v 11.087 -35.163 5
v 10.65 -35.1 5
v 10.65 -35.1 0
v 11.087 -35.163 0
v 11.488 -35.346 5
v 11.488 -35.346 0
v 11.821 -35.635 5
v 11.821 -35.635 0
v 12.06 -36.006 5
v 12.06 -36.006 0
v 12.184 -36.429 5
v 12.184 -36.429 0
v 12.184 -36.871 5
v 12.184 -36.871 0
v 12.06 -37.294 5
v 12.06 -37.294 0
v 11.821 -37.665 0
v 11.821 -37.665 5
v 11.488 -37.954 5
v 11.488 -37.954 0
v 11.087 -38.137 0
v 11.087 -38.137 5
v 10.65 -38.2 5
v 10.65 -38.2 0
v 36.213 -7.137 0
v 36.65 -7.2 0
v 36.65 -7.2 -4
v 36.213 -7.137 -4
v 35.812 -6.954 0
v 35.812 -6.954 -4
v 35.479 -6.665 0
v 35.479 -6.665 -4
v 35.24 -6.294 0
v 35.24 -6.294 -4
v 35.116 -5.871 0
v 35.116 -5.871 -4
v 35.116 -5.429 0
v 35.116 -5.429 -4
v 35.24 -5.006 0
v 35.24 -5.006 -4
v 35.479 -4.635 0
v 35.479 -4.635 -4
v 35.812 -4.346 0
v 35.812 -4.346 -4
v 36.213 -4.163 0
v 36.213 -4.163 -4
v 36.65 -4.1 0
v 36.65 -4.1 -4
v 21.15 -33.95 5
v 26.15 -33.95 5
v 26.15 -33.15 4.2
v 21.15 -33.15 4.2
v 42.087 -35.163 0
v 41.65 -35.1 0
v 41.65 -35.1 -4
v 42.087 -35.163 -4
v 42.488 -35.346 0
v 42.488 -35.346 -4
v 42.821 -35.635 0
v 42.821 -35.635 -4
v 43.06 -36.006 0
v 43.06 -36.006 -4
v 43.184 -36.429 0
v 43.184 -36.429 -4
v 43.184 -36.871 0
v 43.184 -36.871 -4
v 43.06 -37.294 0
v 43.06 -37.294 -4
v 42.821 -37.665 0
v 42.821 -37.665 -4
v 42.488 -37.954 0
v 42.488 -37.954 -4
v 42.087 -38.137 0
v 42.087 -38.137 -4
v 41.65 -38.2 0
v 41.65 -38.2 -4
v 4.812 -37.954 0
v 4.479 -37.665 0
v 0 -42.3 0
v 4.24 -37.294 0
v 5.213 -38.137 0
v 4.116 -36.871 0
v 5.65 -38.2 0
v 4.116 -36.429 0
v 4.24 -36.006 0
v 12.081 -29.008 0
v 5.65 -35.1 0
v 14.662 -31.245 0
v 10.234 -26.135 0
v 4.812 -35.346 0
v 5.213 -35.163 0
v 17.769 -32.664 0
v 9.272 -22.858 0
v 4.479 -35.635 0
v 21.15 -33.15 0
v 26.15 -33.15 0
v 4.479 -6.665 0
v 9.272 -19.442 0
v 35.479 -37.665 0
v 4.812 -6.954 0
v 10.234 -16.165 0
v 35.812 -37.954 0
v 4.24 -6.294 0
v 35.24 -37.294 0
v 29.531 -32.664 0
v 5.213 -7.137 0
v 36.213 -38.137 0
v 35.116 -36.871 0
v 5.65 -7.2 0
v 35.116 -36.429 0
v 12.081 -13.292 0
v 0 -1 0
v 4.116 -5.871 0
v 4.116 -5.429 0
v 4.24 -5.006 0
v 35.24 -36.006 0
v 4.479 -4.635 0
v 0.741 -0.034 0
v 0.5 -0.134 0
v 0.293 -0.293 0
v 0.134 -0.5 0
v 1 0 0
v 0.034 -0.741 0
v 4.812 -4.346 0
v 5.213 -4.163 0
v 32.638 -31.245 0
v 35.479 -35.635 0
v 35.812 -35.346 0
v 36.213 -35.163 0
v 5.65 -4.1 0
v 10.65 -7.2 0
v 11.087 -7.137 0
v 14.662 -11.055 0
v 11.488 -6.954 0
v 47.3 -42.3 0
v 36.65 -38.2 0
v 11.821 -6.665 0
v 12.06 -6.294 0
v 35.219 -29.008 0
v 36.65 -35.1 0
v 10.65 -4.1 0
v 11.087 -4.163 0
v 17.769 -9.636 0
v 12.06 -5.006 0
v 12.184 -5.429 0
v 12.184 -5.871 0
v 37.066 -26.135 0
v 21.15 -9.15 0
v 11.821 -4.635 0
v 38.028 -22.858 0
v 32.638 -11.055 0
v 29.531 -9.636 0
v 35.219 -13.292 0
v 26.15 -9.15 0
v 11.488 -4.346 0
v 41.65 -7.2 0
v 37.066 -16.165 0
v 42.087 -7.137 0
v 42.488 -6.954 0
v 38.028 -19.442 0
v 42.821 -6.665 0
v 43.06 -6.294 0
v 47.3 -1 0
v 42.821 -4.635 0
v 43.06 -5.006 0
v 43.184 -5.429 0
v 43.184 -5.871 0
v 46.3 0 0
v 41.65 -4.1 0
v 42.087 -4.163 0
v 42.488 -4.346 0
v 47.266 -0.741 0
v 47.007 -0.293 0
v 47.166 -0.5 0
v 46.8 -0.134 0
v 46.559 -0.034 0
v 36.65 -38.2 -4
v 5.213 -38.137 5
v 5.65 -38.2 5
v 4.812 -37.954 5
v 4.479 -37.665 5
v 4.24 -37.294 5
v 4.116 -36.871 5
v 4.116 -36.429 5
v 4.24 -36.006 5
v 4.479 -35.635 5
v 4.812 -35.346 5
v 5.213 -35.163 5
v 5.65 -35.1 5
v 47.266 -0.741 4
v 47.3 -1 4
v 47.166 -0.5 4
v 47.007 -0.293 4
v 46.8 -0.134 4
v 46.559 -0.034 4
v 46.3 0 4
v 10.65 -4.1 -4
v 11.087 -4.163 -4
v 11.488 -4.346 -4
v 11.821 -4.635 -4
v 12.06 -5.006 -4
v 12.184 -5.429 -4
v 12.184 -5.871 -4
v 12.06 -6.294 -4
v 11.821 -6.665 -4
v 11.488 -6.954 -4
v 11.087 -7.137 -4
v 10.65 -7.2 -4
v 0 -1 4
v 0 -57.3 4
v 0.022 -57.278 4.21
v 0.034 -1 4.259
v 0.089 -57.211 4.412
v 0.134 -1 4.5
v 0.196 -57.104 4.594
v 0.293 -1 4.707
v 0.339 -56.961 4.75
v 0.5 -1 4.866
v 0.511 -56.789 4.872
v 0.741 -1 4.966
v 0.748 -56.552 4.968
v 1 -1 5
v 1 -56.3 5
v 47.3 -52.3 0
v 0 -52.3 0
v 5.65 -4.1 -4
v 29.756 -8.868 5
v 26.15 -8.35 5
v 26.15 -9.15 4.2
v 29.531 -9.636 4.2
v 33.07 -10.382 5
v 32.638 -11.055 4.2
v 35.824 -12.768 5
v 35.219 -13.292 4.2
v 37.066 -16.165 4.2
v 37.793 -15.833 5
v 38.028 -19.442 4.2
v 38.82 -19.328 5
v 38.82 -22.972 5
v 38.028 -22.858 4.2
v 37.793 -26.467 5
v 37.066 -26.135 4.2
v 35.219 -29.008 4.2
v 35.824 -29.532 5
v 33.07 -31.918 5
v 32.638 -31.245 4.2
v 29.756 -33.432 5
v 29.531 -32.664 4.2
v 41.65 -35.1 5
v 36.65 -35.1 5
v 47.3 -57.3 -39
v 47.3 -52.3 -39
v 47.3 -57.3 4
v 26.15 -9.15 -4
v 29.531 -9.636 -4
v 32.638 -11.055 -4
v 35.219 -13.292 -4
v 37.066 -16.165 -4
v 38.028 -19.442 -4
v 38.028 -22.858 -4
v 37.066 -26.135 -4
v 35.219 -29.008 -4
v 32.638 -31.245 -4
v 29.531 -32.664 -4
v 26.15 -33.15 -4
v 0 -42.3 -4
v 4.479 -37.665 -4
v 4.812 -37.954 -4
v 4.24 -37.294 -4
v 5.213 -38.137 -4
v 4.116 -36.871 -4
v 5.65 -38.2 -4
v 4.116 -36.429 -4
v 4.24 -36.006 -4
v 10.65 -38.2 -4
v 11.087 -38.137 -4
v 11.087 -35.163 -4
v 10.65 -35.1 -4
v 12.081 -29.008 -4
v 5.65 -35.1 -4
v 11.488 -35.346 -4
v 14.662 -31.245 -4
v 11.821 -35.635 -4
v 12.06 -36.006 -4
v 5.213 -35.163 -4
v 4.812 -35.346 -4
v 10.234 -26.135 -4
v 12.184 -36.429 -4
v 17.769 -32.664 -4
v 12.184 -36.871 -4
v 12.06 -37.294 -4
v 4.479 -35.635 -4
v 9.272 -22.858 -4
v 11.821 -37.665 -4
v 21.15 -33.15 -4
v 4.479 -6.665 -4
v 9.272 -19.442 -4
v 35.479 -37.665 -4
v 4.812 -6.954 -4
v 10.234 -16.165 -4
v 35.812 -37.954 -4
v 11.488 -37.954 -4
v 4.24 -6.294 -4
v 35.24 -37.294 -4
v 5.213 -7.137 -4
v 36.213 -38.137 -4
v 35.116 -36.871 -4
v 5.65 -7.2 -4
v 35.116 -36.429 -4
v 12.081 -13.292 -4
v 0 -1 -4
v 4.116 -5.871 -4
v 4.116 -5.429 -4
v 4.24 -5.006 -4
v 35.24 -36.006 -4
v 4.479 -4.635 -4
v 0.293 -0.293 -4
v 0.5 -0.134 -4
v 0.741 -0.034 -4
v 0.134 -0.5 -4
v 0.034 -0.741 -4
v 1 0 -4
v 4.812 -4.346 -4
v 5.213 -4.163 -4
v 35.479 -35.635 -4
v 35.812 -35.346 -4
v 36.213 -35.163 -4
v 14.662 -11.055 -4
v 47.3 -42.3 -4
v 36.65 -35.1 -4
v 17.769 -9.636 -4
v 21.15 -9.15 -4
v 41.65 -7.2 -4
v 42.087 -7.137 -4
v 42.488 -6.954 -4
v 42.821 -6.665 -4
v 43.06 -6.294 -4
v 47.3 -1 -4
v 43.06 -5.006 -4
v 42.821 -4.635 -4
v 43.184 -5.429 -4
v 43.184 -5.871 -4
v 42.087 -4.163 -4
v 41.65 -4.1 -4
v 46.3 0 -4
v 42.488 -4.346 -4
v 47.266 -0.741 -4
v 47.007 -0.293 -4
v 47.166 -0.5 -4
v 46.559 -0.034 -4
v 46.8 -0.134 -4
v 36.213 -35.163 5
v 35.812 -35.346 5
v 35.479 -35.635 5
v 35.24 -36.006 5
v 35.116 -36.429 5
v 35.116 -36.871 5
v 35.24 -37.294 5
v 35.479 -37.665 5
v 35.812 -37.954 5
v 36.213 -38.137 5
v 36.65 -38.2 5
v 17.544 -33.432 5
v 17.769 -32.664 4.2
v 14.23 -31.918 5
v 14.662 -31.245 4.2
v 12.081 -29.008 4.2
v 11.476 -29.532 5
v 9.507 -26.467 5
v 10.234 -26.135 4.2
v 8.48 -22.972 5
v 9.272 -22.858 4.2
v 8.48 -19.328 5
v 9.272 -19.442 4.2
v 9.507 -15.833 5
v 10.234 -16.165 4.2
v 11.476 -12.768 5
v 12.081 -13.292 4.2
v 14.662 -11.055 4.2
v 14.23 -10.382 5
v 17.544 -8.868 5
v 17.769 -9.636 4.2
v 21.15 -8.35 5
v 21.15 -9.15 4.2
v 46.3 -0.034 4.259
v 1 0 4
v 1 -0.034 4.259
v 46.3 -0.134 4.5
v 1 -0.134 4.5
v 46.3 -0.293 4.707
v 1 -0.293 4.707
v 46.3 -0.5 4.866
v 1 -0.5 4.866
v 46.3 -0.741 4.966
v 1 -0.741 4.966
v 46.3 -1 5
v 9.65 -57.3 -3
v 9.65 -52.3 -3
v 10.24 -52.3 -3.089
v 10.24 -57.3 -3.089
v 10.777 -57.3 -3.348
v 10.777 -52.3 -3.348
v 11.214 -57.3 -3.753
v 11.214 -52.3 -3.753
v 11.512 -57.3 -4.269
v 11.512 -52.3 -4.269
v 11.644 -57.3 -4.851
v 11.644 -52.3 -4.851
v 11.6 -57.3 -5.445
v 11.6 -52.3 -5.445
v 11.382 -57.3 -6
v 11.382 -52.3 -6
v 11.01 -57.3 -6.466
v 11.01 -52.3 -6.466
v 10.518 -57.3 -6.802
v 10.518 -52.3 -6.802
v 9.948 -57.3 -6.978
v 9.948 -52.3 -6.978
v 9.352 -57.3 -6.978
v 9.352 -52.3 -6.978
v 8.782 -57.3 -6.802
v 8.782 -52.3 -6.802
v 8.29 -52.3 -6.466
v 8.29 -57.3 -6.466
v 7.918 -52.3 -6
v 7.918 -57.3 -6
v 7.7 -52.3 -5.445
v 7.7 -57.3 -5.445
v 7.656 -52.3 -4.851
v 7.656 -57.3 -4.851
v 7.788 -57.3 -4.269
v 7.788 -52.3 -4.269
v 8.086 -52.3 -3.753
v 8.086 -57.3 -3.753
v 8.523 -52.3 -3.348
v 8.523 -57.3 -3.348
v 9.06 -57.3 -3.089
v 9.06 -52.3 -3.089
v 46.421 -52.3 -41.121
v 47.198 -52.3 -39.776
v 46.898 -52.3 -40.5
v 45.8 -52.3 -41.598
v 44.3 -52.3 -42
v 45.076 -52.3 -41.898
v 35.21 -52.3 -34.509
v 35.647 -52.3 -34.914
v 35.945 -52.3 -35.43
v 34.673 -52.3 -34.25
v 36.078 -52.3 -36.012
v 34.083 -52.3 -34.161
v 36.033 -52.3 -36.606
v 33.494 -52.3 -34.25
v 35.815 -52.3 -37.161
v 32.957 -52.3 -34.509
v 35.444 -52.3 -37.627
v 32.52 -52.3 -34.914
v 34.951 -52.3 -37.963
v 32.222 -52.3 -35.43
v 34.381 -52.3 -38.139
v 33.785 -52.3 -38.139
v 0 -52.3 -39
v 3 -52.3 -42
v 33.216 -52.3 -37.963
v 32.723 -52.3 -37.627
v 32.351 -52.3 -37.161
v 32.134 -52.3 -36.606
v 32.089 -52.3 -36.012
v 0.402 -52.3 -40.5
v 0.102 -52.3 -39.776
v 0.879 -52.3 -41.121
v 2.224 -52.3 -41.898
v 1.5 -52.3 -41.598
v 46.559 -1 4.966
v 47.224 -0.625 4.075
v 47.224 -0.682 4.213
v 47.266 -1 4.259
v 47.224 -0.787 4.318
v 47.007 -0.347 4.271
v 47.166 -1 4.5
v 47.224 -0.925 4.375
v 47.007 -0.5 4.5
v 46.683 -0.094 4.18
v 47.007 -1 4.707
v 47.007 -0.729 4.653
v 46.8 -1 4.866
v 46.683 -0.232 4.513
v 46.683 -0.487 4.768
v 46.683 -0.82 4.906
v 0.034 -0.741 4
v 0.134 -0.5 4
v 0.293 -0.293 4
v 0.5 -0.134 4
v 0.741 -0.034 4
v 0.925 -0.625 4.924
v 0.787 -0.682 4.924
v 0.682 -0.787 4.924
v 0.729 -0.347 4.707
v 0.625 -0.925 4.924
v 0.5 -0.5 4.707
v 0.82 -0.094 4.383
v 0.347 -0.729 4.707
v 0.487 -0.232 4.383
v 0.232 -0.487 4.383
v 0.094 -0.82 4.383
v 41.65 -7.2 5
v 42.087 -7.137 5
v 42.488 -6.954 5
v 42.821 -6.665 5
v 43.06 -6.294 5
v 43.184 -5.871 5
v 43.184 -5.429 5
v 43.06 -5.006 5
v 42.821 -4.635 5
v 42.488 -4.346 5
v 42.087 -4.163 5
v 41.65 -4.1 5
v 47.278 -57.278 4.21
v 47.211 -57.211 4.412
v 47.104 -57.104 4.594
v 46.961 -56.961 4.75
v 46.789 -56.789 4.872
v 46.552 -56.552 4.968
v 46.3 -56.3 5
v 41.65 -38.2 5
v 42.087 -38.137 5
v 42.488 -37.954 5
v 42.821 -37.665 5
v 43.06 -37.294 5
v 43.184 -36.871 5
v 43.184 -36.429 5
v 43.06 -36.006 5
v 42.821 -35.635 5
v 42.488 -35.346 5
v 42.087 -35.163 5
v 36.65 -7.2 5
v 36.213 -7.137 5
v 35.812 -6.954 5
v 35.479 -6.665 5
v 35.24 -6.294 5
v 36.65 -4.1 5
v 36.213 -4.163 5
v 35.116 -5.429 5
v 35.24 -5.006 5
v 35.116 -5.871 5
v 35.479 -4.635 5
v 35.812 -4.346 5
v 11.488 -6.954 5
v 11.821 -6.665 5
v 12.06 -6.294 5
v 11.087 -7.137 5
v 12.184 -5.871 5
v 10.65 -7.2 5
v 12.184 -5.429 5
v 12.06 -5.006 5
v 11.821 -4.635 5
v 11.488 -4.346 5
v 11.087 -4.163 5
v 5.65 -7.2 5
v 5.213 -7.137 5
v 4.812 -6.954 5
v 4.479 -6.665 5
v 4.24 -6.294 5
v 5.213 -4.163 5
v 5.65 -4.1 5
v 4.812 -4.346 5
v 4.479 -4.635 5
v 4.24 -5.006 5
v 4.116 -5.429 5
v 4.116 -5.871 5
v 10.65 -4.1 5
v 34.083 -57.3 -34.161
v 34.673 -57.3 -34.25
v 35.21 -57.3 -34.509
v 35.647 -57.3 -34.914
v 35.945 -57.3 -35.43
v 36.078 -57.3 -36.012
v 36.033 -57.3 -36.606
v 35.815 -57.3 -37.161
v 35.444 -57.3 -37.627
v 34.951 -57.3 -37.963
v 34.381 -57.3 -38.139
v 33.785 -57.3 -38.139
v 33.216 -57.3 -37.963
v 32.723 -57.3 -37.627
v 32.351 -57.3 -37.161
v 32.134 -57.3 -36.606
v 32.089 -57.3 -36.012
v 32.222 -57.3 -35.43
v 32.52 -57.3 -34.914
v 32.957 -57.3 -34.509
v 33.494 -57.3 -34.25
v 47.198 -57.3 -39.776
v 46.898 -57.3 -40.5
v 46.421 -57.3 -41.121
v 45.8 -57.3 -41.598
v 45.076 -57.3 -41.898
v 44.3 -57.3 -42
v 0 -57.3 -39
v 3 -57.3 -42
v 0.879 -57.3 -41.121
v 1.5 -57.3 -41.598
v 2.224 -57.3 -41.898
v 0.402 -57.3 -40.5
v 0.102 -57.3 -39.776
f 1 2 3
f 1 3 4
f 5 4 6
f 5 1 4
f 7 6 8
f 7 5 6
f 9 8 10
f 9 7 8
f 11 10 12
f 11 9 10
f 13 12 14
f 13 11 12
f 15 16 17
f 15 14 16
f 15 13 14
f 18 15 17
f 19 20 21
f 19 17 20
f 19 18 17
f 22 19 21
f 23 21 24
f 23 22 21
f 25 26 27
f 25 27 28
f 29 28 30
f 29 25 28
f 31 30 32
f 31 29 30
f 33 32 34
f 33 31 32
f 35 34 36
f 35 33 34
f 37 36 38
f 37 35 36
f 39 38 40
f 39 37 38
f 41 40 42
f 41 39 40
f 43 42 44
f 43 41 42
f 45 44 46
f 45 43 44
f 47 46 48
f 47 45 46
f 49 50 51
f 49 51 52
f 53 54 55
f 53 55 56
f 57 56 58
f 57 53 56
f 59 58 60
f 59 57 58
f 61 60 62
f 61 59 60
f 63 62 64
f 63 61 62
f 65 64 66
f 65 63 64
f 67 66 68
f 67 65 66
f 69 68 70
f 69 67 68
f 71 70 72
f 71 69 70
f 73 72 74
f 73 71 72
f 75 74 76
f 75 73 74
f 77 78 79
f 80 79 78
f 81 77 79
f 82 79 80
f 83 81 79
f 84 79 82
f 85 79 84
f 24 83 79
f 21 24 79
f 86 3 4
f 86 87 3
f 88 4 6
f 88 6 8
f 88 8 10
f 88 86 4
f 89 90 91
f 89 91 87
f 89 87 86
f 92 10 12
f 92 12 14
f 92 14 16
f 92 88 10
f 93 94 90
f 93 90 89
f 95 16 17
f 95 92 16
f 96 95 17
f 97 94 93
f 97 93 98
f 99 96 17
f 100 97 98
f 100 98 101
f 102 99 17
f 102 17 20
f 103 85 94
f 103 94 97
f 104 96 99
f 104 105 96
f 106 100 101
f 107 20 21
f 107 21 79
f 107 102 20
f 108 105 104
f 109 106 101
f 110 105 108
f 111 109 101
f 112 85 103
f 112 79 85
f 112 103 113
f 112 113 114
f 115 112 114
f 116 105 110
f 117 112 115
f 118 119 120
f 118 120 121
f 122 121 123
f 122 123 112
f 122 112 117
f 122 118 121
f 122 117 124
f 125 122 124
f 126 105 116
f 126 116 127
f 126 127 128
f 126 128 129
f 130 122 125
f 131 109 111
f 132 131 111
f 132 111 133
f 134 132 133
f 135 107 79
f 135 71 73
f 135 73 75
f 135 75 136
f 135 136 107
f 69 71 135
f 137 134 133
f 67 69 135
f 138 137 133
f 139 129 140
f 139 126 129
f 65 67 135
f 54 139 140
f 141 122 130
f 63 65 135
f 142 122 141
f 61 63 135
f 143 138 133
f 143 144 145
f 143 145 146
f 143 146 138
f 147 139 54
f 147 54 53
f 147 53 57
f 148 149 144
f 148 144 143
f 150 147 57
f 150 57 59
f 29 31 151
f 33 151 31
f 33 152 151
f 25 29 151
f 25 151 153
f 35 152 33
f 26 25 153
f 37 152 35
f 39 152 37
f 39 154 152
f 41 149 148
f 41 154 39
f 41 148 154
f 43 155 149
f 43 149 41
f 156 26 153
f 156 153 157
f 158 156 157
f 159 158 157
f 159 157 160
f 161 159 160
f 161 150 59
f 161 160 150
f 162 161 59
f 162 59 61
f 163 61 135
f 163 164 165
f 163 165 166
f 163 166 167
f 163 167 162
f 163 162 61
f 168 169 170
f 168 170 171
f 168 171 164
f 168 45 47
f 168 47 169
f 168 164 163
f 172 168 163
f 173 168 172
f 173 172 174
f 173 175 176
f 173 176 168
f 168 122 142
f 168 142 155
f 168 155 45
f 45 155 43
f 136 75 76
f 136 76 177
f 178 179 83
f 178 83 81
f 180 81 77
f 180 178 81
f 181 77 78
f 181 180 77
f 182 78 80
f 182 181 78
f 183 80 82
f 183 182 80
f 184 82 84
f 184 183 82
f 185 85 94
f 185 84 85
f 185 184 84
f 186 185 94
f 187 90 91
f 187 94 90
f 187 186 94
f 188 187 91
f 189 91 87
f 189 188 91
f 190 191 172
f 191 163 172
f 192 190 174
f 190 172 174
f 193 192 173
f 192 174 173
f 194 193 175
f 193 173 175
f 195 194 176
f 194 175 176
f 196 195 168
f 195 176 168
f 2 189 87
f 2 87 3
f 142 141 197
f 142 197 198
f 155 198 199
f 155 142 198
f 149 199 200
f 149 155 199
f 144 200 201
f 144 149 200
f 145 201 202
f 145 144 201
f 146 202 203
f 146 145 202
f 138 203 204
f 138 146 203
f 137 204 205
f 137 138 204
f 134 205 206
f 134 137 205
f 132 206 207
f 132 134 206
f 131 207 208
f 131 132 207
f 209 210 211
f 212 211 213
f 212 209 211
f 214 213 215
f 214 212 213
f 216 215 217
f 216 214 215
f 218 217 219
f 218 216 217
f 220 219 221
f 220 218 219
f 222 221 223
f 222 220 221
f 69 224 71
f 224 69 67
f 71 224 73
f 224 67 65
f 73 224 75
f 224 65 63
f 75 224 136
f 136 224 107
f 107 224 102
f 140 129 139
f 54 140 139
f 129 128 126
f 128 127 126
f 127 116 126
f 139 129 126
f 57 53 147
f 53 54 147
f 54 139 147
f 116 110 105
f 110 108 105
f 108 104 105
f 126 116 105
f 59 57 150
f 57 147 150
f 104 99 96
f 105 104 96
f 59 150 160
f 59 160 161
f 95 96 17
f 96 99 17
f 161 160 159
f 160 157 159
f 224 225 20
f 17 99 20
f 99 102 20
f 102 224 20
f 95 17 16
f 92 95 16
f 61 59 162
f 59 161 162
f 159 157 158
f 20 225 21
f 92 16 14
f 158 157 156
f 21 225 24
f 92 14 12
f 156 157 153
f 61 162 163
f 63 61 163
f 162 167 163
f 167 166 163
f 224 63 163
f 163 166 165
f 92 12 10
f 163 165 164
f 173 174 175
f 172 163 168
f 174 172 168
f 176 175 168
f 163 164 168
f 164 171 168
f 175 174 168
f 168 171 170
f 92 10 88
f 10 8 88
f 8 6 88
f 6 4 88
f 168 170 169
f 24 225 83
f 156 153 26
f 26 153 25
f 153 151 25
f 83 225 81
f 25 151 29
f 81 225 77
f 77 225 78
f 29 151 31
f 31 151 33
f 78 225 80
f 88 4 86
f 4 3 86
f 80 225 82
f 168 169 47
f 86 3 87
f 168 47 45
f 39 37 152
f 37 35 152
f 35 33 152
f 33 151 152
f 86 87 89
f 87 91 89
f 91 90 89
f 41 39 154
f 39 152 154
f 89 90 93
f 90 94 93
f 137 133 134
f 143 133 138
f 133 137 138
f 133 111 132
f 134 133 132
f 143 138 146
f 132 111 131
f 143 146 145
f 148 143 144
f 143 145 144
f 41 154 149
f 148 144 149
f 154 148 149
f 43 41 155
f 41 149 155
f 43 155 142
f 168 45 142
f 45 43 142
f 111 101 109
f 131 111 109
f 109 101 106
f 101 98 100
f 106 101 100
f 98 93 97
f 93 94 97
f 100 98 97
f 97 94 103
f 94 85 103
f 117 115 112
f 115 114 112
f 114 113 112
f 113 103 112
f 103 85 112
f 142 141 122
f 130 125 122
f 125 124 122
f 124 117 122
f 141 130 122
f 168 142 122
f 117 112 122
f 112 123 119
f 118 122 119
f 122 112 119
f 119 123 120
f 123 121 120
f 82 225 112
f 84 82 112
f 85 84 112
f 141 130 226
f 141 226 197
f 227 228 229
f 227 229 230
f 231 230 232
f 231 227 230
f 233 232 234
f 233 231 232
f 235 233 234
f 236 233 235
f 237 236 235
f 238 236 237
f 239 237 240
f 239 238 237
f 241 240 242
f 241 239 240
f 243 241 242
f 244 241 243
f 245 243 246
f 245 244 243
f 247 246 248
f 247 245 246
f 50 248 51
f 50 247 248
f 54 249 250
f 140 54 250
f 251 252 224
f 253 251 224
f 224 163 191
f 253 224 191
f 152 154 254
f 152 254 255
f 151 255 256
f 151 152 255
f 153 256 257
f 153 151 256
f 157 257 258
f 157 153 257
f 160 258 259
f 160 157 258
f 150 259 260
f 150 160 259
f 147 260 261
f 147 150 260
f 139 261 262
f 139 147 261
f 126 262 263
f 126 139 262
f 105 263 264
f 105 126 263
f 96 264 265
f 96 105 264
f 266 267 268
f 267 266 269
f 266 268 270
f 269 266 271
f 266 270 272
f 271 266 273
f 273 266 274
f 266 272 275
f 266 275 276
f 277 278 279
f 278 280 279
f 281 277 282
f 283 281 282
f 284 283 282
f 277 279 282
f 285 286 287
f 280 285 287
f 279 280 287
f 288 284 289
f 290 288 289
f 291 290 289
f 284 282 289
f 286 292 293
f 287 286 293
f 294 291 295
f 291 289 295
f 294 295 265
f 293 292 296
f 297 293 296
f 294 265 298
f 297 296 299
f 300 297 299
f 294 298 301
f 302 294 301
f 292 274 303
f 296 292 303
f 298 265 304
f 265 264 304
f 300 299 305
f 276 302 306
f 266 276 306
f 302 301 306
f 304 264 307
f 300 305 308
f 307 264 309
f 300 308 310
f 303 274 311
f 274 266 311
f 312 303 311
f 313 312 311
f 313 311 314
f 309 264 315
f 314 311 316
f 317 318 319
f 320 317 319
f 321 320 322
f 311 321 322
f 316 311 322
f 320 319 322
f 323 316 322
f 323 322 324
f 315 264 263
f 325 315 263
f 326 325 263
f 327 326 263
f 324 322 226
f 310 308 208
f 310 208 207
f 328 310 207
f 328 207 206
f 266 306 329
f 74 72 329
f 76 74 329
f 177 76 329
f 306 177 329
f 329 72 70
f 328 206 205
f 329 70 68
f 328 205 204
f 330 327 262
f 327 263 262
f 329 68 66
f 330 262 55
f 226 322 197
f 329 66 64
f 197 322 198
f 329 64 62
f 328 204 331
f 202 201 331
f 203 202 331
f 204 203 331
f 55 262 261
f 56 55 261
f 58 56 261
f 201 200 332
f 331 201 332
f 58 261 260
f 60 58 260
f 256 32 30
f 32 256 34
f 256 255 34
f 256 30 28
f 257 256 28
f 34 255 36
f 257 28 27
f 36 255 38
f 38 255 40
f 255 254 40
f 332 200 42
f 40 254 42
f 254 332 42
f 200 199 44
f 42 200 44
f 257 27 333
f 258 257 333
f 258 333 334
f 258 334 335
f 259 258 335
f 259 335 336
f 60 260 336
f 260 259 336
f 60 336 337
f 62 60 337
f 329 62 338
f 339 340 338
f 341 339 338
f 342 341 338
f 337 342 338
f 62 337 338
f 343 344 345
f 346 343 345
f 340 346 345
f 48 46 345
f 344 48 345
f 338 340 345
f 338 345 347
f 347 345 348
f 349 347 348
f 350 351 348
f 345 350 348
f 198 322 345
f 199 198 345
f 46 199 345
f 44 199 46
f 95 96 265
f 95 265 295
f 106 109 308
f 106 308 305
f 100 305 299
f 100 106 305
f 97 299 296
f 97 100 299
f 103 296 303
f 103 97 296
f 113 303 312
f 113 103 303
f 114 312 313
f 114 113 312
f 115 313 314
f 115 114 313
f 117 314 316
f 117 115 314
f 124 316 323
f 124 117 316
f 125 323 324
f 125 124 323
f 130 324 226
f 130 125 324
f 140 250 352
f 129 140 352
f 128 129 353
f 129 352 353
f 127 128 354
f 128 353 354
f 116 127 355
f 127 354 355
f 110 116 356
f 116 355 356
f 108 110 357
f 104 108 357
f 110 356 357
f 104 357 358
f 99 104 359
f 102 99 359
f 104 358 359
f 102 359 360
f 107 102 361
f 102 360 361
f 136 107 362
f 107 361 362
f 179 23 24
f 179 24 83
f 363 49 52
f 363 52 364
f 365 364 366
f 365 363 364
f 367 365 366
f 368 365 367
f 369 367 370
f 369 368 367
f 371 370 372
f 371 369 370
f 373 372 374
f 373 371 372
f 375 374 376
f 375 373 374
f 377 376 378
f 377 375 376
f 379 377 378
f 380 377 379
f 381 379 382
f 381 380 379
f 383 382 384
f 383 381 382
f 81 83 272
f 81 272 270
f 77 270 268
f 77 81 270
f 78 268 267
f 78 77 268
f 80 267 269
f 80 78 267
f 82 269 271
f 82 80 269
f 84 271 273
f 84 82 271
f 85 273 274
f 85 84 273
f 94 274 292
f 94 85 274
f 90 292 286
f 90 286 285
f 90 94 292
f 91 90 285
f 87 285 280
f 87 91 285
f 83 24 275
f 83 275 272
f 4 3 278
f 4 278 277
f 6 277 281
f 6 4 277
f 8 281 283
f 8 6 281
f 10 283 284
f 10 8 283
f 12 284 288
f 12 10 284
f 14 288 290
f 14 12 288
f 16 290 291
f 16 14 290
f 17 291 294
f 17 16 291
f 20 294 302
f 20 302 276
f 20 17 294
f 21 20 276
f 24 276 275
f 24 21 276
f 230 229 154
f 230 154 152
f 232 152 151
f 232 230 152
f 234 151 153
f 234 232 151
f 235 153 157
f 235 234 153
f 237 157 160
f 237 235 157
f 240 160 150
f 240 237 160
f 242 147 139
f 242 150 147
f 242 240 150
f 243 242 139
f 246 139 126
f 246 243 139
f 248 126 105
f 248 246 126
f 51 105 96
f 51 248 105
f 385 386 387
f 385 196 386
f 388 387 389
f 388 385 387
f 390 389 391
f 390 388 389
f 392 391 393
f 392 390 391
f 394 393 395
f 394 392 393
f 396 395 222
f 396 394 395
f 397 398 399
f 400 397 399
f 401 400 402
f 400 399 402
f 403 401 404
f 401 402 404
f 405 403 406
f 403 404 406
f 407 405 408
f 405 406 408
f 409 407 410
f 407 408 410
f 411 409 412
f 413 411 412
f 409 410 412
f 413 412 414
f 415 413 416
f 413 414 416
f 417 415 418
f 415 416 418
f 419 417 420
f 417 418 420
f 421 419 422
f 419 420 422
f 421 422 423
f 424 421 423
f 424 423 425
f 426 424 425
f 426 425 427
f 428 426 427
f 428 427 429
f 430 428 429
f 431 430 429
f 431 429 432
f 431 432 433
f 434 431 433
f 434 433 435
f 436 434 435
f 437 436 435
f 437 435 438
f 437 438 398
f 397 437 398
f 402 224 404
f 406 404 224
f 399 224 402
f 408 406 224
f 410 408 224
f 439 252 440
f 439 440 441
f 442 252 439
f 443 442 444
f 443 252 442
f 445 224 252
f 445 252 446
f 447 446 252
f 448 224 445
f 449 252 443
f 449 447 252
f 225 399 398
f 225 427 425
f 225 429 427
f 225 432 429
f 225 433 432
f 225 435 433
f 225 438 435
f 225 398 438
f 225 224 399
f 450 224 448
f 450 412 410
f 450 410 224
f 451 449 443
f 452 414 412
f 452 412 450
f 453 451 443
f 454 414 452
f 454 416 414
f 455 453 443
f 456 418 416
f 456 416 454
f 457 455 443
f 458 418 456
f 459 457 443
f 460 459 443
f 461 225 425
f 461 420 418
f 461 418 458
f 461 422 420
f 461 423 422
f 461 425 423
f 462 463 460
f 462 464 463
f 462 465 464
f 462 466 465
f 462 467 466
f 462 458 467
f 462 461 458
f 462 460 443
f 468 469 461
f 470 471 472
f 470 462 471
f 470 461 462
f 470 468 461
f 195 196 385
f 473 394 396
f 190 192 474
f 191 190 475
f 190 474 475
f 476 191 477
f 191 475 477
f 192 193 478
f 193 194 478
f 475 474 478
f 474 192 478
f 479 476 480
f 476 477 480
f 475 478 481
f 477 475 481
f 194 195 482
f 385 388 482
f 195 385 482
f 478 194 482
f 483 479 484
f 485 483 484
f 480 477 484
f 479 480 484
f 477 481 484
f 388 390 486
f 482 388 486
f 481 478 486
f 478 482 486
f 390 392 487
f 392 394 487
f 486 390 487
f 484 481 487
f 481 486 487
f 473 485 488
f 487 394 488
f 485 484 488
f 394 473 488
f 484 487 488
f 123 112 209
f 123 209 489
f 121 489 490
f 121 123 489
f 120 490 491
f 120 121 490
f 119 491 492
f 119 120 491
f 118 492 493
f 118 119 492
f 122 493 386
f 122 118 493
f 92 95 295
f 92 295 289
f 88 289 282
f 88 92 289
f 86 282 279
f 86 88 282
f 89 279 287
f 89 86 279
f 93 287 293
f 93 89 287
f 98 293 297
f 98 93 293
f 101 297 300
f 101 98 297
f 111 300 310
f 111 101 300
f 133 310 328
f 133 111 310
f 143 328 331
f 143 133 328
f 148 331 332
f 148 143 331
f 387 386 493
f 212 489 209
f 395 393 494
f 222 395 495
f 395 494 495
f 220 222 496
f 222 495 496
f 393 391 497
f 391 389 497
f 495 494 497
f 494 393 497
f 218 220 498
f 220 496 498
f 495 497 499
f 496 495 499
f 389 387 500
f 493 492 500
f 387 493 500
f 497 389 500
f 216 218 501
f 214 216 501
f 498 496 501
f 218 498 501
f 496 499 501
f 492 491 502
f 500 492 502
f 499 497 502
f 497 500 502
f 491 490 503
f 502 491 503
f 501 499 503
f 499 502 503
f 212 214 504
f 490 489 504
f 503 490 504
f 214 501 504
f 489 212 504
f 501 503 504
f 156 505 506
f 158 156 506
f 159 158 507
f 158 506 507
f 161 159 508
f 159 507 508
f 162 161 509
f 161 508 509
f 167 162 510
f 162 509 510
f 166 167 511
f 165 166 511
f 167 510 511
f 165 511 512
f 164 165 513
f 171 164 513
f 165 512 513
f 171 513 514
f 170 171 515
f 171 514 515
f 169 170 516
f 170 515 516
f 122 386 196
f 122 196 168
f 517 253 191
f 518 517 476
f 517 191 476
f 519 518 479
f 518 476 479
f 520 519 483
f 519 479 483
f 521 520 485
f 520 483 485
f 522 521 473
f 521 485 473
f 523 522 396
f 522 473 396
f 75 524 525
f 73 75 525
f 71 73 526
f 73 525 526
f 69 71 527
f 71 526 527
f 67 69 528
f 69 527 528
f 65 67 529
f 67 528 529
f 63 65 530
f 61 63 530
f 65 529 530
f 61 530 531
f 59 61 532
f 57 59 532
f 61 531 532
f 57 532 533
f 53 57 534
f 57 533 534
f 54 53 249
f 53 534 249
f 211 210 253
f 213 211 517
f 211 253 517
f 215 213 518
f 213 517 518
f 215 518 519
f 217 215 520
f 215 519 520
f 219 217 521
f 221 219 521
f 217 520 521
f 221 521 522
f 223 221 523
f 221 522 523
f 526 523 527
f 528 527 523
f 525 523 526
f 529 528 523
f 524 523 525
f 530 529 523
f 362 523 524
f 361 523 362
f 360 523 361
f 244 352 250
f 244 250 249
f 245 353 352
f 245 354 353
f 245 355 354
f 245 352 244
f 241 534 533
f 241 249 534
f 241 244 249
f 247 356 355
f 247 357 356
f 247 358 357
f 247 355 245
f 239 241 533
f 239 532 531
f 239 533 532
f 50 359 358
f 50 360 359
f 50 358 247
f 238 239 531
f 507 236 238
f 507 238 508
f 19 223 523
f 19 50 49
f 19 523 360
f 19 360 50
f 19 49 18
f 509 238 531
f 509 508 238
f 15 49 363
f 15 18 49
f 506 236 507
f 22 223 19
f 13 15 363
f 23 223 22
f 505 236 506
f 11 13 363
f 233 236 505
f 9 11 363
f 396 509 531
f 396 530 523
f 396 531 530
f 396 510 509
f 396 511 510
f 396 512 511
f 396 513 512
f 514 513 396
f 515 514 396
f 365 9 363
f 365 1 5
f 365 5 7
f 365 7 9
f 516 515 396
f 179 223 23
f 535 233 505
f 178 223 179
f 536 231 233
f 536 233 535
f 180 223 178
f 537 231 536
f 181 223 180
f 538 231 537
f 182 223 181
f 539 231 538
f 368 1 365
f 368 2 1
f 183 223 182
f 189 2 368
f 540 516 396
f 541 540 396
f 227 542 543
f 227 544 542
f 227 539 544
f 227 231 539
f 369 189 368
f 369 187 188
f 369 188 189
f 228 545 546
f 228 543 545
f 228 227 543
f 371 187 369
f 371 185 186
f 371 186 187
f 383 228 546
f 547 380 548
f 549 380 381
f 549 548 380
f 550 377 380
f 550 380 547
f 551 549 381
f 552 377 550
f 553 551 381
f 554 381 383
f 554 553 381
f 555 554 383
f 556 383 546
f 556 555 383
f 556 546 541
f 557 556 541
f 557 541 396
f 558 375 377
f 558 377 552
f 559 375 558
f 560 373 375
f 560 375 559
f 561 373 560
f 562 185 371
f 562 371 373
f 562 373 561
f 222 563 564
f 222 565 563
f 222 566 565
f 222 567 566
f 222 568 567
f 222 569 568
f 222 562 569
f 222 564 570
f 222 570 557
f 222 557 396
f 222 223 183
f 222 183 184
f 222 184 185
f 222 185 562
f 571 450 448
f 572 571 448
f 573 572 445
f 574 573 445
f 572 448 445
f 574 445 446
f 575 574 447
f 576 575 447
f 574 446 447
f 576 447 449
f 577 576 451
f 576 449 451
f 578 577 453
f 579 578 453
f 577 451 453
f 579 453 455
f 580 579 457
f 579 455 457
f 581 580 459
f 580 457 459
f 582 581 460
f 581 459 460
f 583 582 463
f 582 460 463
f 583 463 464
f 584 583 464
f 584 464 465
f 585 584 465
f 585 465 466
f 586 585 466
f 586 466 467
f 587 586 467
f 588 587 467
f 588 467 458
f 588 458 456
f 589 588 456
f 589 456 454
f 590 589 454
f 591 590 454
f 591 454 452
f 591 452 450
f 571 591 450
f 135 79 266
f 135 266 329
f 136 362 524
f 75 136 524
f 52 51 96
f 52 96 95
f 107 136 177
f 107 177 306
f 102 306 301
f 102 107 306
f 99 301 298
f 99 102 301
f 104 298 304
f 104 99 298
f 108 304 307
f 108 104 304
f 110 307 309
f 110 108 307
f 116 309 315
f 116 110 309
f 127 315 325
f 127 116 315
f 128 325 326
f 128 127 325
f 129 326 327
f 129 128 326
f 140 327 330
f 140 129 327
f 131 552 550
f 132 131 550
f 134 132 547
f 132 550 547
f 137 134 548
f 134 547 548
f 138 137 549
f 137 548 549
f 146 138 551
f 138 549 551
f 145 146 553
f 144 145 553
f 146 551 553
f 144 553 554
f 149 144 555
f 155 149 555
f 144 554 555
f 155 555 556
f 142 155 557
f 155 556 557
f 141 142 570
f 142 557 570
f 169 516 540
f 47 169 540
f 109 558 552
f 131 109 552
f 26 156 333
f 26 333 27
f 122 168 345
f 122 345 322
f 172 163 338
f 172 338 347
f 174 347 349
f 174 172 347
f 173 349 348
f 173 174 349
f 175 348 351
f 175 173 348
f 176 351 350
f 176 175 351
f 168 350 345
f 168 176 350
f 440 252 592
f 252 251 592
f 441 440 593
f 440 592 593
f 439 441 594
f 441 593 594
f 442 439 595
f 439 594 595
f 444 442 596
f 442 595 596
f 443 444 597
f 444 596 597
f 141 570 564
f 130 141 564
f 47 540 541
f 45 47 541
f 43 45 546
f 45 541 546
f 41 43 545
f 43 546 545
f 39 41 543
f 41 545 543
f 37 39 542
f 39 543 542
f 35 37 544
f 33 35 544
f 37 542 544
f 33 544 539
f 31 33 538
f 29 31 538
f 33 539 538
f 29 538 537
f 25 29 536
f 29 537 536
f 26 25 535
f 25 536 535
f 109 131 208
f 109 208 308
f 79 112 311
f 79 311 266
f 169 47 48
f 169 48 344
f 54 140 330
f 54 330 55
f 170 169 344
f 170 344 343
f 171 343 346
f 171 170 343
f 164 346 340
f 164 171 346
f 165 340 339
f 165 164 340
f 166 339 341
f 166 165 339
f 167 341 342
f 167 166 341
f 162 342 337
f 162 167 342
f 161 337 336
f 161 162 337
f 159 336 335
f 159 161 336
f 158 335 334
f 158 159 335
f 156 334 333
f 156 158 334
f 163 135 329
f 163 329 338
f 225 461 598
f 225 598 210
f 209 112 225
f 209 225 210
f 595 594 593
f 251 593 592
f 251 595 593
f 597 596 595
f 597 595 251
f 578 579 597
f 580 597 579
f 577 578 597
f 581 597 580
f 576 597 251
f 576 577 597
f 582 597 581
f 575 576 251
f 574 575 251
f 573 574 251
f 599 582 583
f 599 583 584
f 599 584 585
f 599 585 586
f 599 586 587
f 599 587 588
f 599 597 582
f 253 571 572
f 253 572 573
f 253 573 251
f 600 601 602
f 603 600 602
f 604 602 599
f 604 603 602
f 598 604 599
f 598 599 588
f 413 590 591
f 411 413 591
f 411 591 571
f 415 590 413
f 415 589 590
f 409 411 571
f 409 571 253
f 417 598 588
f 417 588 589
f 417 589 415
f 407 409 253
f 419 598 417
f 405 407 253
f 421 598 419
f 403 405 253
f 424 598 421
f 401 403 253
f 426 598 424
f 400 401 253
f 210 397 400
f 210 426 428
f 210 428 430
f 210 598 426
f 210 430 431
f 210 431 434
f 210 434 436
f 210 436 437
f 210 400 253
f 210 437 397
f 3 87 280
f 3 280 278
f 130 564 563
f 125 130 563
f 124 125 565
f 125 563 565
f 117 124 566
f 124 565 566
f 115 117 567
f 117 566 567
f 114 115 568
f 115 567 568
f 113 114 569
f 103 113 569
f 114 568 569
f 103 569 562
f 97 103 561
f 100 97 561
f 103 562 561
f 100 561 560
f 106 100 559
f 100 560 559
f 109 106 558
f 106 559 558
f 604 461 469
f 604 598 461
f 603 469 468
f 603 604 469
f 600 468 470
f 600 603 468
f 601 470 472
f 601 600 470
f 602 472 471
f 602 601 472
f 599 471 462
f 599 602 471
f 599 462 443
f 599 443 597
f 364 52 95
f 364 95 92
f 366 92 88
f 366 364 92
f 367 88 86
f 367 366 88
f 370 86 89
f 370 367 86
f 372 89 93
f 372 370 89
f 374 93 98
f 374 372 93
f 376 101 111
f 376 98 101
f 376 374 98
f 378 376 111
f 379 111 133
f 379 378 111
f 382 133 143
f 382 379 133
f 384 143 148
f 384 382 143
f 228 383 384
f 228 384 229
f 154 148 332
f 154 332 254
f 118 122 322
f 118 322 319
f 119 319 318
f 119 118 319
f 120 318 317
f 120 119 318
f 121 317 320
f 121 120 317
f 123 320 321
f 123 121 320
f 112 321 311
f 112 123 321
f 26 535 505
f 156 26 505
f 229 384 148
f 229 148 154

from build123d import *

# Parameters (mm, degrees)
BOSS_EXTRUDE2_DEPTH = 47.3
CUT_EXTRUDE1_REACH  = 89.918
FILLET1_R           = 1
CHAMFER1_SIZE       = 0.8
FILLET2_R           = 3
CUT_EXTRUDE2_REACH  = 84.077
SKETCH4_R           = 2
BOSS_EXTRUDE3_DEPTH = 4


with BuildPart() as part:
    # Sketch2 → Boss-Extrude2 (new body)
    with BuildSketch(Plane(origin=(0, 0, 0), x_dir=(0, 0, -1), z_dir=(1, 0, 0))):
        Polygon((0, 0), (0, -47.3), (0, -52.3), (42, -52.3), (42, -57.3), (-5, -57.3), (-5, 0), align=None)
    extrude(amount=BOSS_EXTRUDE2_DEPTH)

    # Sketch3 → Cut-Extrude1 (cut, up to next)
    with BuildSketch(Plane.XY.offset(5), mode=Mode.PRIVATE) as cut_extrude1_sk1:
        with BuildLine():
            Line((21.15, -9.15), (26.15, -9.15))
            ThreePointArc((26.15, -9.15), (38.15, -21.15), (26.15, -33.15))
            Line((26.15, -33.15), (21.15, -33.15))
            ThreePointArc((21.15, -33.15), (9.15, -21.15), (21.15, -9.15))
        make_face()
    cut_extrude1_tool1 = extrude(cut_extrude1_sk1.sketch, amount=-CUT_EXTRUDE1_REACH, mode=Mode.PRIVATE) & part.part
    # Sketch3 → Cut-Extrude1 (cut, up to next)
    with BuildSketch(Plane.XY.offset(5), mode=Mode.PRIVATE) as cut_extrude1_sk2:
        with BuildLine():
            Line((5.65, -35.1), (10.65, -35.1))
            ThreePointArc((10.65, -35.1), (12.2, -36.65), (10.65, -38.2))
            Line((10.65, -38.2), (5.65, -38.2))
            ThreePointArc((5.65, -38.2), (4.1, -36.65), (5.65, -35.1))
        make_face()
    cut_extrude1_tool2 = extrude(cut_extrude1_sk2.sketch, amount=-CUT_EXTRUDE1_REACH, mode=Mode.PRIVATE) & part.part
    # Sketch3 → Cut-Extrude1 (cut, up to next)
    with BuildSketch(Plane.XY.offset(5), mode=Mode.PRIVATE) as cut_extrude1_sk3:
        with BuildLine():
            Line((5.65, -7.2), (10.65, -7.2))
            ThreePointArc((10.65, -7.2), (12.2, -5.65), (10.65, -4.1))
            Line((10.65, -4.1), (5.65, -4.1))
            ThreePointArc((5.65, -4.1), (4.1, -5.65), (5.65, -7.2))
        make_face()
    cut_extrude1_tool3 = extrude(cut_extrude1_sk3.sketch, amount=-CUT_EXTRUDE1_REACH, mode=Mode.PRIVATE) & part.part
    # Sketch3 → Cut-Extrude1 (cut, up to next)
    with BuildSketch(Plane.XY.offset(5), mode=Mode.PRIVATE) as cut_extrude1_sk4:
        with BuildLine():
            Line((36.65, -7.2), (41.65, -7.2))
            ThreePointArc((41.65, -7.2), (43.2, -5.65), (41.65, -4.1))
            Line((41.65, -4.1), (36.65, -4.1))
            ThreePointArc((36.65, -4.1), (35.1, -5.65), (36.65, -7.2))
        make_face()
    cut_extrude1_tool4 = extrude(cut_extrude1_sk4.sketch, amount=-CUT_EXTRUDE1_REACH, mode=Mode.PRIVATE) & part.part
    # Sketch3 → Cut-Extrude1 (cut, up to next)
    with BuildSketch(Plane.XY.offset(5), mode=Mode.PRIVATE) as cut_extrude1_sk5:
        with BuildLine():
            Line((36.65, -38.2), (41.65, -38.2))
            ThreePointArc((41.65, -38.2), (43.2, -36.65), (41.65, -35.1))
            Line((41.65, -35.1), (36.65, -35.1))
            ThreePointArc((36.65, -35.1), (35.1, -36.65), (36.65, -38.2))
        make_face()
    cut_extrude1_tool5 = extrude(cut_extrude1_sk5.sketch, amount=-CUT_EXTRUDE1_REACH, mode=Mode.PRIVATE) & part.part
    add(cut_extrude1_tool1.solids().sort_by_distance((23.65, -21.15, 5))[0], mode=Mode.SUBTRACT)
    add(cut_extrude1_tool2.solids().sort_by_distance((8.15, -36.65, 5))[0], mode=Mode.SUBTRACT)
    add(cut_extrude1_tool3.solids().sort_by_distance((8.15, -5.65, 5))[0], mode=Mode.SUBTRACT)
    add(cut_extrude1_tool4.solids().sort_by_distance((39.15, -5.65, 5))[0], mode=Mode.SUBTRACT)
    add(cut_extrude1_tool5.solids().sort_by_distance((39.15, -36.65, 5))[0], mode=Mode.SUBTRACT)

    # Fillet1
    fillet1_edges = [part.edges().sort_by_distance(p)[0] for p in [
        (0, 0, 2.5),
        (23.65, -57.3, 5),
        (23.65, 0, 5),
        (47.3, 0, 2.5),
        (47.3, -28.65, 5),
        (0, -28.65, 5),
    ]]
    fillet(fillet1_edges, radius=FILLET1_R)

    # Chamfer1
    chamfer1_edges = [part.edges().sort_by_distance(p)[0] for p in [
        (9.15, -21.15, 5),
        (23.65, -33.15, 5),
        (38.15, -21.15, 5),
        (23.65, -9.15, 5),
    ]]
    chamfer(chamfer1_edges, length=CHAMFER1_SIZE)

    # Fillet2
    fillet2_edges = [part.edges().sort_by_distance(p)[0] for p in [
        (47.3, -54.8, -42),
        (0, -54.8, -42),
    ]]
    fillet(fillet2_edges, radius=FILLET2_R)

    # Sketch4 → Cut-Extrude2 (cut, up to next)
    with BuildSketch(Plane(origin=(0, -52.3, 0), x_dir=(1, 0, 0), z_dir=(0, 1, 0)), mode=Mode.PRIVATE) as cut_extrude2_sk1:
        with Locations(Location((9.65, 5, 0), (0, 0, 270))):
            Circle(SKETCH4_R)
    cut_extrude2_tool1 = extrude(cut_extrude2_sk1.sketch, amount=-CUT_EXTRUDE2_REACH, mode=Mode.PRIVATE) & part.part
    # Sketch4 → Cut-Extrude2 (cut, up to next)
    with BuildSketch(Plane(origin=(0, -52.3, 0), x_dir=(1, 0, 0), z_dir=(0, 1, 0)), mode=Mode.PRIVATE) as cut_extrude2_sk2:
        with Locations(Location((34.083374087, 36.161037061, 0), (0, 0, 270))):
            Circle(SKETCH4_R)
    cut_extrude2_tool2 = extrude(cut_extrude2_sk2.sketch, amount=-CUT_EXTRUDE2_REACH, mode=Mode.PRIVATE) & part.part
    add(cut_extrude2_tool1.solids().sort_by_distance((9.65, -52.3, -5))[0], mode=Mode.SUBTRACT)
    add(cut_extrude2_tool2.solids().sort_by_distance((34.083374, -52.3, -36.161037))[0], mode=Mode.SUBTRACT)


with BuildPart() as body_2:
    # Sketch5 → Boss-Extrude3 (new body)
    with BuildSketch(Plane(origin=(0, 0, 0), x_dir=(-1, 0, 0), z_dir=(0, 0, -1))):
        with BuildLine():
            Line((-46.3, 0), (-1, 0))
            ThreePointArc((-1, 0), (-0.292893219, -0.292893219), (0, -1))
            Line((0, -1), (0, -42.3))
            Line((0, -42.3), (-47.3, -42.3))
            Line((-47.3, -42.3), (-47.3, -1))
            ThreePointArc((-47.3, -1), (-47.007106781, -0.292893219), (-46.3, 0))
        make_face()
        with BuildLine():
            Line((-21.15, -9.15), (-26.15, -9.15))
            ThreePointArc((-26.15, -9.15), (-38.15, -21.15), (-26.15, -33.15))
            Line((-26.15, -33.15), (-21.15, -33.15))
            ThreePointArc((-21.15, -33.15), (-9.15, -21.15), (-21.15, -9.15))
        make_face(mode=Mode.SUBTRACT)
        with BuildLine():
            Line((-41.65, -7.2), (-36.65, -7.2))
            ThreePointArc((-36.65, -7.2), (-35.1, -5.65), (-36.65, -4.1))
            Line((-36.65, -4.1), (-41.65, -4.1))
            ThreePointArc((-41.65, -4.1), (-43.2, -5.65), (-41.65, -7.2))
        make_face(mode=Mode.SUBTRACT)
        with BuildLine():
            Line((-41.65, -38.2), (-36.65, -38.2))
            ThreePointArc((-36.65, -38.2), (-35.1, -36.65), (-36.65, -35.1))
            Line((-36.65, -35.1), (-41.65, -35.1))
            ThreePointArc((-41.65, -35.1), (-43.2, -36.65), (-41.65, -38.2))
        make_face(mode=Mode.SUBTRACT)
        with BuildLine():
            Line((-10.65, -38.2), (-5.65, -38.2))
            ThreePointArc((-5.65, -38.2), (-4.1, -36.65), (-5.65, -35.1))
            Line((-5.65, -35.1), (-10.65, -35.1))
            ThreePointArc((-10.65, -35.1), (-12.2, -36.65), (-10.65, -38.2))
        make_face(mode=Mode.SUBTRACT)
        with BuildLine():
            Line((-5.65, -4.1), (-10.65, -4.1))
            ThreePointArc((-10.65, -4.1), (-12.2, -5.65), (-10.65, -7.2))
            Line((-10.65, -7.2), (-5.65, -7.2))
            ThreePointArc((-5.65, -7.2), (-4.1, -5.65), (-5.65, -4.1))
        make_face(mode=Mode.SUBTRACT)
    extrude(amount=BOSS_EXTRUDE3_DEPTH)


solid = Compound([part.part, body_2.part])
